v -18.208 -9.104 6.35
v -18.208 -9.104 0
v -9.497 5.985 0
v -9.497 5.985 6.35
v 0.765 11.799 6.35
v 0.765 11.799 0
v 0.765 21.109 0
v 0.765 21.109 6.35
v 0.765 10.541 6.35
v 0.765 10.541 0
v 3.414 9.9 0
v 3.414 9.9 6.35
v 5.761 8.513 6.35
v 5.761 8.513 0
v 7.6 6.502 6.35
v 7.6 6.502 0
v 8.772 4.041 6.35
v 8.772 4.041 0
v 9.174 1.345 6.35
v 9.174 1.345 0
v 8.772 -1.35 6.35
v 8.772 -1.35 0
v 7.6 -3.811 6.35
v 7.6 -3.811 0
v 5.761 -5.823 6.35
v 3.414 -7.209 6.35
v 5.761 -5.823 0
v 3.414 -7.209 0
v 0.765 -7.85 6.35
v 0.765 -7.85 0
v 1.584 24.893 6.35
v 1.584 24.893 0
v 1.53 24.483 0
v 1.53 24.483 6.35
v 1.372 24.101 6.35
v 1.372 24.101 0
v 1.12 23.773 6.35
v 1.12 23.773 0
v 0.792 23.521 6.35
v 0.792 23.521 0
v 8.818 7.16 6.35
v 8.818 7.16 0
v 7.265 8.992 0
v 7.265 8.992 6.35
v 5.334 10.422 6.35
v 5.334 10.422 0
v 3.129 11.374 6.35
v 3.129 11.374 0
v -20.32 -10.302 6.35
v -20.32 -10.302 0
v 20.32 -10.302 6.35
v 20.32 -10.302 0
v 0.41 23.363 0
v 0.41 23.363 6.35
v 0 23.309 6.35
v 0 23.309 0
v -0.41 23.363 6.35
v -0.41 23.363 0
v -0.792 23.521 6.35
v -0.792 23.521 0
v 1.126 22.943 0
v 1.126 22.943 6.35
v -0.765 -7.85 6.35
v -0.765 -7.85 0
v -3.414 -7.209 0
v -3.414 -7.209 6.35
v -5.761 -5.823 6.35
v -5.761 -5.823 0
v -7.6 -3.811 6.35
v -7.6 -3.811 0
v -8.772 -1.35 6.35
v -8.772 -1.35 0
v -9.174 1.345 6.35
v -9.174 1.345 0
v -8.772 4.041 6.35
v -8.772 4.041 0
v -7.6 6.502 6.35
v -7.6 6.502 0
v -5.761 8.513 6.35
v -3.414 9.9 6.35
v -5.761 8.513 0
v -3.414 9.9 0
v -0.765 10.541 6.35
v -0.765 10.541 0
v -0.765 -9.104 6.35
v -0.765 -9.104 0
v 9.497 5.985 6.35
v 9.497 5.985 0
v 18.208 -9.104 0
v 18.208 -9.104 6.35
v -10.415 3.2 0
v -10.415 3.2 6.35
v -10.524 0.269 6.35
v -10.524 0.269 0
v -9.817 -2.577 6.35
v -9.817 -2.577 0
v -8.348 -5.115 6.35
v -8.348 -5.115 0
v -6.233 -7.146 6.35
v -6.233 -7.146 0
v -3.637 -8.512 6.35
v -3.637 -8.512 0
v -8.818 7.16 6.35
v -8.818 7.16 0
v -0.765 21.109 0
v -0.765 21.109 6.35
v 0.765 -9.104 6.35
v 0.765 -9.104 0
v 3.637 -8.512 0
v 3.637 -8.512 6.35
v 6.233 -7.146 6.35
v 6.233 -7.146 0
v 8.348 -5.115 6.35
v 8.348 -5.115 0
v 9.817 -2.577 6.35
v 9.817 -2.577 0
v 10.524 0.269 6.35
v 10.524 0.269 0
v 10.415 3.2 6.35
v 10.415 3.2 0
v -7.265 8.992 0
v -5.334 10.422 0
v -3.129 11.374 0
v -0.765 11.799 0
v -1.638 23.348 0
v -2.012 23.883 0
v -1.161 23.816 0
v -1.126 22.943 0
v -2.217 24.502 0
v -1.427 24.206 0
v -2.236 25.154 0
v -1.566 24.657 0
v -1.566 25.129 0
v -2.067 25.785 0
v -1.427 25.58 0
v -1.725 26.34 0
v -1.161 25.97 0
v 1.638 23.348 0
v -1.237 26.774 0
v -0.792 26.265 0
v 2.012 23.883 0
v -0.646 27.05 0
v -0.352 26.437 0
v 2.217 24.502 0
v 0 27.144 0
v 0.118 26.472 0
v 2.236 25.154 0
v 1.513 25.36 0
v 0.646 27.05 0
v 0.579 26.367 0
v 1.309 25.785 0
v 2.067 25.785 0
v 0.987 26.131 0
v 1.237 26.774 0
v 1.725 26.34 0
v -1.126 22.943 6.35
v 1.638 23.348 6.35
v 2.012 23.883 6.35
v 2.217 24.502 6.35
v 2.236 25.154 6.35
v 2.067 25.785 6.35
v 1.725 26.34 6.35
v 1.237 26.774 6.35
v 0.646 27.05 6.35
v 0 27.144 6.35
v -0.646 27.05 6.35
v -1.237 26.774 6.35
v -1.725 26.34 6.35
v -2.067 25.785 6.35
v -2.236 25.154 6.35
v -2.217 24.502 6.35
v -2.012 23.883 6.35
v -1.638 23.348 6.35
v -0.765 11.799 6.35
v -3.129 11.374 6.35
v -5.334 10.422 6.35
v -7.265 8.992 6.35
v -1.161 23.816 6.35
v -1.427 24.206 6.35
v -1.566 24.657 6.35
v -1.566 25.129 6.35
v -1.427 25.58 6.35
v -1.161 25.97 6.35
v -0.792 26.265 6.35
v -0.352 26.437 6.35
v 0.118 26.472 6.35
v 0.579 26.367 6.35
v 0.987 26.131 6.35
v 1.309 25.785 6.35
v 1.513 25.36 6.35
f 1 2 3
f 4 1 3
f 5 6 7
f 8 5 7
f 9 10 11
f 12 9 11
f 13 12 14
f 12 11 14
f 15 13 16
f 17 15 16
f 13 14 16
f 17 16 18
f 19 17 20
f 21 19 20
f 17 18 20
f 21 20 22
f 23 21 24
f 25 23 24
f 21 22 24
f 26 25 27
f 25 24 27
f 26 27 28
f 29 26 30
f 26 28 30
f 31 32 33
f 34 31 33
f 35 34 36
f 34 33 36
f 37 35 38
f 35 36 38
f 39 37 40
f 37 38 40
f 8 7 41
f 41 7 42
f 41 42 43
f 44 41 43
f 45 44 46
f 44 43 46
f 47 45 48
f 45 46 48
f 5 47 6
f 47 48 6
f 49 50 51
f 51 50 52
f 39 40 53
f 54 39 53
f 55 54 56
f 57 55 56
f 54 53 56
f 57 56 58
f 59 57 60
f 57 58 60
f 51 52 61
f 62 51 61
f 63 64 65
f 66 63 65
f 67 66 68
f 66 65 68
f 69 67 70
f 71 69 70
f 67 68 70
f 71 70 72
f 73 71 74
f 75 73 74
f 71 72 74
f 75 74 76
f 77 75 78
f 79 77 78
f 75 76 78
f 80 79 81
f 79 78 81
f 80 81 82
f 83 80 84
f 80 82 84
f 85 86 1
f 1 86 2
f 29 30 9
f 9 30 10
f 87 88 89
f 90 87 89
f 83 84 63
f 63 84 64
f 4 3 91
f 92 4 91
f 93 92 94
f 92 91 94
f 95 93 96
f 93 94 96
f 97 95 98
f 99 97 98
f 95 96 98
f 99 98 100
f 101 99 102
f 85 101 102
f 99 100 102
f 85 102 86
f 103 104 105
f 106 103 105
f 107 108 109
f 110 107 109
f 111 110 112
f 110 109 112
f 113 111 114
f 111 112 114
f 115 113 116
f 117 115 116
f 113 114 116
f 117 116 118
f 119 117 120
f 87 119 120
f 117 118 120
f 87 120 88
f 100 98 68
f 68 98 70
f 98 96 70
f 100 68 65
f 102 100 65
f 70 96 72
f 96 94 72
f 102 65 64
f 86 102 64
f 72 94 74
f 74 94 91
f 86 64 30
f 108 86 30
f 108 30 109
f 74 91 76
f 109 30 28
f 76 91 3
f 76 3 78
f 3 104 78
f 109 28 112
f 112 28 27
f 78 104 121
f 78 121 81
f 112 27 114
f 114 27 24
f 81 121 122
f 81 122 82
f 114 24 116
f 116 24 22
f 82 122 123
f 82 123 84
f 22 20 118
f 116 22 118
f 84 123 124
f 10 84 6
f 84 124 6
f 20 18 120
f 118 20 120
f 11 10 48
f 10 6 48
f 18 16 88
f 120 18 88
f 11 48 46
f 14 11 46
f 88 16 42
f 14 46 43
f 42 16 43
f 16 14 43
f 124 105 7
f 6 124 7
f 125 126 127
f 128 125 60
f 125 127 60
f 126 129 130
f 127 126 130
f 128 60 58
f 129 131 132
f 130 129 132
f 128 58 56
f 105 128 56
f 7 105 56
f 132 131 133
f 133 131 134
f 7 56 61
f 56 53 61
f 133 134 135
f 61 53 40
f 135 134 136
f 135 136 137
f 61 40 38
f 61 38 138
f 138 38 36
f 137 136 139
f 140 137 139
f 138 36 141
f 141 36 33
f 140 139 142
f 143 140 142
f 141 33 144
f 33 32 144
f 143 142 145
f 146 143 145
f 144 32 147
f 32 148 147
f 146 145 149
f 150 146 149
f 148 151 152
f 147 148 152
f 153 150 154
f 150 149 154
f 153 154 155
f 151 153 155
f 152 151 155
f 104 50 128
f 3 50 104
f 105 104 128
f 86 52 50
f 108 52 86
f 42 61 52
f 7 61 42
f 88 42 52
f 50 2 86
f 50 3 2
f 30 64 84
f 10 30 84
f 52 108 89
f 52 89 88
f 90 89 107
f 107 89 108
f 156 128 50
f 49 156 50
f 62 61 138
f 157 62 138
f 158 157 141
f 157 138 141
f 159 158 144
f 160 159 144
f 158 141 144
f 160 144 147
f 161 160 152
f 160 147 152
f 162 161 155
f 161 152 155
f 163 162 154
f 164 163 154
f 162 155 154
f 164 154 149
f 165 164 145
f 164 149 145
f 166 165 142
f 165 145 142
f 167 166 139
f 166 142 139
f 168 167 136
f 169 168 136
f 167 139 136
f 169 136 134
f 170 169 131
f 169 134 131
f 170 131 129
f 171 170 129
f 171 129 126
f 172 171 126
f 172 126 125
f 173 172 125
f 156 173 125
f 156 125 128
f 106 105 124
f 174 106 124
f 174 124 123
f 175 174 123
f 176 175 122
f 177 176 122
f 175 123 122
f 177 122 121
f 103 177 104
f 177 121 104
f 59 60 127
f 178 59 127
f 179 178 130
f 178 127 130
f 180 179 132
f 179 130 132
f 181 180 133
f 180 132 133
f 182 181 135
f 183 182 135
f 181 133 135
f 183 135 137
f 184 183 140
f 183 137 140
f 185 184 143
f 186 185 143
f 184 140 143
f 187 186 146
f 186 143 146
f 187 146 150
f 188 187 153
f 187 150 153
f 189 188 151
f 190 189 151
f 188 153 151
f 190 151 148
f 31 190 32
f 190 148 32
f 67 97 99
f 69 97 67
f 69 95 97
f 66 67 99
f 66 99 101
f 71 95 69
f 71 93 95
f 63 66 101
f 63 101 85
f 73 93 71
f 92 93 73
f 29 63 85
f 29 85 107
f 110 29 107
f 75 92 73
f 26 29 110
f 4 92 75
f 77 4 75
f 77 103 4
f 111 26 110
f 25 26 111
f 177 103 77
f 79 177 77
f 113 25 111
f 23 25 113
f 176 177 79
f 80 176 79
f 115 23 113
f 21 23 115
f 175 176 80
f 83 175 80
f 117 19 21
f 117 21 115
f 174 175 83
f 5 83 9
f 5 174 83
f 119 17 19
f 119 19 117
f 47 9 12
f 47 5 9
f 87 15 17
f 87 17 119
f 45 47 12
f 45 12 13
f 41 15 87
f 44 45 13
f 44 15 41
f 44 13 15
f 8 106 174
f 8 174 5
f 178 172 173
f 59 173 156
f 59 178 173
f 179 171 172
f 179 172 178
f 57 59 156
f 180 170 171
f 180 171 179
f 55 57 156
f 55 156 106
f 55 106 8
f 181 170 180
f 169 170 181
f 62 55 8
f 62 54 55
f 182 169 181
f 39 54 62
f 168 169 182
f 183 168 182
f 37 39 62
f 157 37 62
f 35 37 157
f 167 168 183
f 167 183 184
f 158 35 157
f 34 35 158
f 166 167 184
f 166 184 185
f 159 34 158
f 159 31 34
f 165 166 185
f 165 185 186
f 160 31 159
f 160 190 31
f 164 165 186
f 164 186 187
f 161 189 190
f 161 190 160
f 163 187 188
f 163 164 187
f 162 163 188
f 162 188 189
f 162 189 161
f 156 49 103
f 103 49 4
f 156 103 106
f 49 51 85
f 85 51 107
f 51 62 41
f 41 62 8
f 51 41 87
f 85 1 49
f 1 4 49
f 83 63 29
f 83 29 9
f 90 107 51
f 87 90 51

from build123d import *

# Parameters (mm, degrees)
F1_DEPTH = 6.35


with BuildPart() as f1:
    # F0 (on Top) → F1 (new body)
    with BuildSketch(Plane.XY):
        with BuildLine():
            Line((-1.125735, 22.943184), (-20.32, -10.302259))
            Line((-20.32, -10.302259), (0, -10.302259))
            Line((0, -10.302259), (20.32, -10.302259))
            Line((20.32, -10.302259), (1.125735, 22.943184))
            ThreePointArc((1.125735, 22.943184), (0, 27.144483), (-1.125735, 22.943184))
        make_face()
        with BuildLine():
            Line((-0.764991, -9.103689), (-18.208449, -9.103689))
            Line((-18.208449, -9.103689), (-9.496779, 5.985365))
            ThreePointArc((-9.496779, 5.985365), (-9.171397, -3.89734), (-0.764991, -9.103689))
        make_face(mode=Mode.SUBTRACT)
        with BuildLine():
            Line((-0.764991, 10.540828), (-0.764991, -7.850349))
            ThreePointArc((-0.764991, -7.850349), (-9.174241, 1.345239), (-0.764991, 10.540828))
        make_face(mode=Mode.SUBTRACT)
        with BuildLine():
            ThreePointArc((0.764991, -9.103689), (9.171397, -3.89734), (9.496779, 5.985365))
            Line((9.496779, 5.985365), (18.208449, -9.103689))
            Line((18.208449, -9.103689), (0.764991, -9.103689))
        make_face(mode=Mode.SUBTRACT)
        with BuildLine():
            Line((0.764991, -7.850349), (0.764991, 10.540828))
            ThreePointArc((0.764991, 10.540828), (9.174241, 1.345239), (0.764991, -7.850349))
        make_face(mode=Mode.SUBTRACT)
        with BuildLine():
            Line((-0.764991, 21.109266), (-0.764991, 11.799275))
            ThreePointArc((-0.764991, 11.799275), (-5.334498, 10.422163), (-8.818391, 7.160368))
            Line((-8.818391, 7.160368), (-0.764991, 21.109266))
        make_face(mode=Mode.SUBTRACT)
        with BuildLine():
            ThreePointArc((8.818391, 7.160368), (5.334498, 10.422163), (0.764991, 11.799275))
            Line((0.764991, 11.799275), (0.764991, 21.109266))
            Line((0.764991, 21.109266), (8.818391, 7.160368))
        make_face(mode=Mode.SUBTRACT)
        with BuildLine():
            ThreePointArc((1.583799, 24.893014), (1.37161, 24.101114), (0.7919, 23.521403))
            ThreePointArc((0.7919, 23.521403), (0, 23.309214), (-0.7919, 23.521403))
            ThreePointArc((-0.7919, 23.521403), (-0.7919, 26.264624), (1.583799, 24.893014))
        make_face(mode=Mode.SUBTRACT)
    extrude(amount=F1_DEPTH)


solid = f1.part
